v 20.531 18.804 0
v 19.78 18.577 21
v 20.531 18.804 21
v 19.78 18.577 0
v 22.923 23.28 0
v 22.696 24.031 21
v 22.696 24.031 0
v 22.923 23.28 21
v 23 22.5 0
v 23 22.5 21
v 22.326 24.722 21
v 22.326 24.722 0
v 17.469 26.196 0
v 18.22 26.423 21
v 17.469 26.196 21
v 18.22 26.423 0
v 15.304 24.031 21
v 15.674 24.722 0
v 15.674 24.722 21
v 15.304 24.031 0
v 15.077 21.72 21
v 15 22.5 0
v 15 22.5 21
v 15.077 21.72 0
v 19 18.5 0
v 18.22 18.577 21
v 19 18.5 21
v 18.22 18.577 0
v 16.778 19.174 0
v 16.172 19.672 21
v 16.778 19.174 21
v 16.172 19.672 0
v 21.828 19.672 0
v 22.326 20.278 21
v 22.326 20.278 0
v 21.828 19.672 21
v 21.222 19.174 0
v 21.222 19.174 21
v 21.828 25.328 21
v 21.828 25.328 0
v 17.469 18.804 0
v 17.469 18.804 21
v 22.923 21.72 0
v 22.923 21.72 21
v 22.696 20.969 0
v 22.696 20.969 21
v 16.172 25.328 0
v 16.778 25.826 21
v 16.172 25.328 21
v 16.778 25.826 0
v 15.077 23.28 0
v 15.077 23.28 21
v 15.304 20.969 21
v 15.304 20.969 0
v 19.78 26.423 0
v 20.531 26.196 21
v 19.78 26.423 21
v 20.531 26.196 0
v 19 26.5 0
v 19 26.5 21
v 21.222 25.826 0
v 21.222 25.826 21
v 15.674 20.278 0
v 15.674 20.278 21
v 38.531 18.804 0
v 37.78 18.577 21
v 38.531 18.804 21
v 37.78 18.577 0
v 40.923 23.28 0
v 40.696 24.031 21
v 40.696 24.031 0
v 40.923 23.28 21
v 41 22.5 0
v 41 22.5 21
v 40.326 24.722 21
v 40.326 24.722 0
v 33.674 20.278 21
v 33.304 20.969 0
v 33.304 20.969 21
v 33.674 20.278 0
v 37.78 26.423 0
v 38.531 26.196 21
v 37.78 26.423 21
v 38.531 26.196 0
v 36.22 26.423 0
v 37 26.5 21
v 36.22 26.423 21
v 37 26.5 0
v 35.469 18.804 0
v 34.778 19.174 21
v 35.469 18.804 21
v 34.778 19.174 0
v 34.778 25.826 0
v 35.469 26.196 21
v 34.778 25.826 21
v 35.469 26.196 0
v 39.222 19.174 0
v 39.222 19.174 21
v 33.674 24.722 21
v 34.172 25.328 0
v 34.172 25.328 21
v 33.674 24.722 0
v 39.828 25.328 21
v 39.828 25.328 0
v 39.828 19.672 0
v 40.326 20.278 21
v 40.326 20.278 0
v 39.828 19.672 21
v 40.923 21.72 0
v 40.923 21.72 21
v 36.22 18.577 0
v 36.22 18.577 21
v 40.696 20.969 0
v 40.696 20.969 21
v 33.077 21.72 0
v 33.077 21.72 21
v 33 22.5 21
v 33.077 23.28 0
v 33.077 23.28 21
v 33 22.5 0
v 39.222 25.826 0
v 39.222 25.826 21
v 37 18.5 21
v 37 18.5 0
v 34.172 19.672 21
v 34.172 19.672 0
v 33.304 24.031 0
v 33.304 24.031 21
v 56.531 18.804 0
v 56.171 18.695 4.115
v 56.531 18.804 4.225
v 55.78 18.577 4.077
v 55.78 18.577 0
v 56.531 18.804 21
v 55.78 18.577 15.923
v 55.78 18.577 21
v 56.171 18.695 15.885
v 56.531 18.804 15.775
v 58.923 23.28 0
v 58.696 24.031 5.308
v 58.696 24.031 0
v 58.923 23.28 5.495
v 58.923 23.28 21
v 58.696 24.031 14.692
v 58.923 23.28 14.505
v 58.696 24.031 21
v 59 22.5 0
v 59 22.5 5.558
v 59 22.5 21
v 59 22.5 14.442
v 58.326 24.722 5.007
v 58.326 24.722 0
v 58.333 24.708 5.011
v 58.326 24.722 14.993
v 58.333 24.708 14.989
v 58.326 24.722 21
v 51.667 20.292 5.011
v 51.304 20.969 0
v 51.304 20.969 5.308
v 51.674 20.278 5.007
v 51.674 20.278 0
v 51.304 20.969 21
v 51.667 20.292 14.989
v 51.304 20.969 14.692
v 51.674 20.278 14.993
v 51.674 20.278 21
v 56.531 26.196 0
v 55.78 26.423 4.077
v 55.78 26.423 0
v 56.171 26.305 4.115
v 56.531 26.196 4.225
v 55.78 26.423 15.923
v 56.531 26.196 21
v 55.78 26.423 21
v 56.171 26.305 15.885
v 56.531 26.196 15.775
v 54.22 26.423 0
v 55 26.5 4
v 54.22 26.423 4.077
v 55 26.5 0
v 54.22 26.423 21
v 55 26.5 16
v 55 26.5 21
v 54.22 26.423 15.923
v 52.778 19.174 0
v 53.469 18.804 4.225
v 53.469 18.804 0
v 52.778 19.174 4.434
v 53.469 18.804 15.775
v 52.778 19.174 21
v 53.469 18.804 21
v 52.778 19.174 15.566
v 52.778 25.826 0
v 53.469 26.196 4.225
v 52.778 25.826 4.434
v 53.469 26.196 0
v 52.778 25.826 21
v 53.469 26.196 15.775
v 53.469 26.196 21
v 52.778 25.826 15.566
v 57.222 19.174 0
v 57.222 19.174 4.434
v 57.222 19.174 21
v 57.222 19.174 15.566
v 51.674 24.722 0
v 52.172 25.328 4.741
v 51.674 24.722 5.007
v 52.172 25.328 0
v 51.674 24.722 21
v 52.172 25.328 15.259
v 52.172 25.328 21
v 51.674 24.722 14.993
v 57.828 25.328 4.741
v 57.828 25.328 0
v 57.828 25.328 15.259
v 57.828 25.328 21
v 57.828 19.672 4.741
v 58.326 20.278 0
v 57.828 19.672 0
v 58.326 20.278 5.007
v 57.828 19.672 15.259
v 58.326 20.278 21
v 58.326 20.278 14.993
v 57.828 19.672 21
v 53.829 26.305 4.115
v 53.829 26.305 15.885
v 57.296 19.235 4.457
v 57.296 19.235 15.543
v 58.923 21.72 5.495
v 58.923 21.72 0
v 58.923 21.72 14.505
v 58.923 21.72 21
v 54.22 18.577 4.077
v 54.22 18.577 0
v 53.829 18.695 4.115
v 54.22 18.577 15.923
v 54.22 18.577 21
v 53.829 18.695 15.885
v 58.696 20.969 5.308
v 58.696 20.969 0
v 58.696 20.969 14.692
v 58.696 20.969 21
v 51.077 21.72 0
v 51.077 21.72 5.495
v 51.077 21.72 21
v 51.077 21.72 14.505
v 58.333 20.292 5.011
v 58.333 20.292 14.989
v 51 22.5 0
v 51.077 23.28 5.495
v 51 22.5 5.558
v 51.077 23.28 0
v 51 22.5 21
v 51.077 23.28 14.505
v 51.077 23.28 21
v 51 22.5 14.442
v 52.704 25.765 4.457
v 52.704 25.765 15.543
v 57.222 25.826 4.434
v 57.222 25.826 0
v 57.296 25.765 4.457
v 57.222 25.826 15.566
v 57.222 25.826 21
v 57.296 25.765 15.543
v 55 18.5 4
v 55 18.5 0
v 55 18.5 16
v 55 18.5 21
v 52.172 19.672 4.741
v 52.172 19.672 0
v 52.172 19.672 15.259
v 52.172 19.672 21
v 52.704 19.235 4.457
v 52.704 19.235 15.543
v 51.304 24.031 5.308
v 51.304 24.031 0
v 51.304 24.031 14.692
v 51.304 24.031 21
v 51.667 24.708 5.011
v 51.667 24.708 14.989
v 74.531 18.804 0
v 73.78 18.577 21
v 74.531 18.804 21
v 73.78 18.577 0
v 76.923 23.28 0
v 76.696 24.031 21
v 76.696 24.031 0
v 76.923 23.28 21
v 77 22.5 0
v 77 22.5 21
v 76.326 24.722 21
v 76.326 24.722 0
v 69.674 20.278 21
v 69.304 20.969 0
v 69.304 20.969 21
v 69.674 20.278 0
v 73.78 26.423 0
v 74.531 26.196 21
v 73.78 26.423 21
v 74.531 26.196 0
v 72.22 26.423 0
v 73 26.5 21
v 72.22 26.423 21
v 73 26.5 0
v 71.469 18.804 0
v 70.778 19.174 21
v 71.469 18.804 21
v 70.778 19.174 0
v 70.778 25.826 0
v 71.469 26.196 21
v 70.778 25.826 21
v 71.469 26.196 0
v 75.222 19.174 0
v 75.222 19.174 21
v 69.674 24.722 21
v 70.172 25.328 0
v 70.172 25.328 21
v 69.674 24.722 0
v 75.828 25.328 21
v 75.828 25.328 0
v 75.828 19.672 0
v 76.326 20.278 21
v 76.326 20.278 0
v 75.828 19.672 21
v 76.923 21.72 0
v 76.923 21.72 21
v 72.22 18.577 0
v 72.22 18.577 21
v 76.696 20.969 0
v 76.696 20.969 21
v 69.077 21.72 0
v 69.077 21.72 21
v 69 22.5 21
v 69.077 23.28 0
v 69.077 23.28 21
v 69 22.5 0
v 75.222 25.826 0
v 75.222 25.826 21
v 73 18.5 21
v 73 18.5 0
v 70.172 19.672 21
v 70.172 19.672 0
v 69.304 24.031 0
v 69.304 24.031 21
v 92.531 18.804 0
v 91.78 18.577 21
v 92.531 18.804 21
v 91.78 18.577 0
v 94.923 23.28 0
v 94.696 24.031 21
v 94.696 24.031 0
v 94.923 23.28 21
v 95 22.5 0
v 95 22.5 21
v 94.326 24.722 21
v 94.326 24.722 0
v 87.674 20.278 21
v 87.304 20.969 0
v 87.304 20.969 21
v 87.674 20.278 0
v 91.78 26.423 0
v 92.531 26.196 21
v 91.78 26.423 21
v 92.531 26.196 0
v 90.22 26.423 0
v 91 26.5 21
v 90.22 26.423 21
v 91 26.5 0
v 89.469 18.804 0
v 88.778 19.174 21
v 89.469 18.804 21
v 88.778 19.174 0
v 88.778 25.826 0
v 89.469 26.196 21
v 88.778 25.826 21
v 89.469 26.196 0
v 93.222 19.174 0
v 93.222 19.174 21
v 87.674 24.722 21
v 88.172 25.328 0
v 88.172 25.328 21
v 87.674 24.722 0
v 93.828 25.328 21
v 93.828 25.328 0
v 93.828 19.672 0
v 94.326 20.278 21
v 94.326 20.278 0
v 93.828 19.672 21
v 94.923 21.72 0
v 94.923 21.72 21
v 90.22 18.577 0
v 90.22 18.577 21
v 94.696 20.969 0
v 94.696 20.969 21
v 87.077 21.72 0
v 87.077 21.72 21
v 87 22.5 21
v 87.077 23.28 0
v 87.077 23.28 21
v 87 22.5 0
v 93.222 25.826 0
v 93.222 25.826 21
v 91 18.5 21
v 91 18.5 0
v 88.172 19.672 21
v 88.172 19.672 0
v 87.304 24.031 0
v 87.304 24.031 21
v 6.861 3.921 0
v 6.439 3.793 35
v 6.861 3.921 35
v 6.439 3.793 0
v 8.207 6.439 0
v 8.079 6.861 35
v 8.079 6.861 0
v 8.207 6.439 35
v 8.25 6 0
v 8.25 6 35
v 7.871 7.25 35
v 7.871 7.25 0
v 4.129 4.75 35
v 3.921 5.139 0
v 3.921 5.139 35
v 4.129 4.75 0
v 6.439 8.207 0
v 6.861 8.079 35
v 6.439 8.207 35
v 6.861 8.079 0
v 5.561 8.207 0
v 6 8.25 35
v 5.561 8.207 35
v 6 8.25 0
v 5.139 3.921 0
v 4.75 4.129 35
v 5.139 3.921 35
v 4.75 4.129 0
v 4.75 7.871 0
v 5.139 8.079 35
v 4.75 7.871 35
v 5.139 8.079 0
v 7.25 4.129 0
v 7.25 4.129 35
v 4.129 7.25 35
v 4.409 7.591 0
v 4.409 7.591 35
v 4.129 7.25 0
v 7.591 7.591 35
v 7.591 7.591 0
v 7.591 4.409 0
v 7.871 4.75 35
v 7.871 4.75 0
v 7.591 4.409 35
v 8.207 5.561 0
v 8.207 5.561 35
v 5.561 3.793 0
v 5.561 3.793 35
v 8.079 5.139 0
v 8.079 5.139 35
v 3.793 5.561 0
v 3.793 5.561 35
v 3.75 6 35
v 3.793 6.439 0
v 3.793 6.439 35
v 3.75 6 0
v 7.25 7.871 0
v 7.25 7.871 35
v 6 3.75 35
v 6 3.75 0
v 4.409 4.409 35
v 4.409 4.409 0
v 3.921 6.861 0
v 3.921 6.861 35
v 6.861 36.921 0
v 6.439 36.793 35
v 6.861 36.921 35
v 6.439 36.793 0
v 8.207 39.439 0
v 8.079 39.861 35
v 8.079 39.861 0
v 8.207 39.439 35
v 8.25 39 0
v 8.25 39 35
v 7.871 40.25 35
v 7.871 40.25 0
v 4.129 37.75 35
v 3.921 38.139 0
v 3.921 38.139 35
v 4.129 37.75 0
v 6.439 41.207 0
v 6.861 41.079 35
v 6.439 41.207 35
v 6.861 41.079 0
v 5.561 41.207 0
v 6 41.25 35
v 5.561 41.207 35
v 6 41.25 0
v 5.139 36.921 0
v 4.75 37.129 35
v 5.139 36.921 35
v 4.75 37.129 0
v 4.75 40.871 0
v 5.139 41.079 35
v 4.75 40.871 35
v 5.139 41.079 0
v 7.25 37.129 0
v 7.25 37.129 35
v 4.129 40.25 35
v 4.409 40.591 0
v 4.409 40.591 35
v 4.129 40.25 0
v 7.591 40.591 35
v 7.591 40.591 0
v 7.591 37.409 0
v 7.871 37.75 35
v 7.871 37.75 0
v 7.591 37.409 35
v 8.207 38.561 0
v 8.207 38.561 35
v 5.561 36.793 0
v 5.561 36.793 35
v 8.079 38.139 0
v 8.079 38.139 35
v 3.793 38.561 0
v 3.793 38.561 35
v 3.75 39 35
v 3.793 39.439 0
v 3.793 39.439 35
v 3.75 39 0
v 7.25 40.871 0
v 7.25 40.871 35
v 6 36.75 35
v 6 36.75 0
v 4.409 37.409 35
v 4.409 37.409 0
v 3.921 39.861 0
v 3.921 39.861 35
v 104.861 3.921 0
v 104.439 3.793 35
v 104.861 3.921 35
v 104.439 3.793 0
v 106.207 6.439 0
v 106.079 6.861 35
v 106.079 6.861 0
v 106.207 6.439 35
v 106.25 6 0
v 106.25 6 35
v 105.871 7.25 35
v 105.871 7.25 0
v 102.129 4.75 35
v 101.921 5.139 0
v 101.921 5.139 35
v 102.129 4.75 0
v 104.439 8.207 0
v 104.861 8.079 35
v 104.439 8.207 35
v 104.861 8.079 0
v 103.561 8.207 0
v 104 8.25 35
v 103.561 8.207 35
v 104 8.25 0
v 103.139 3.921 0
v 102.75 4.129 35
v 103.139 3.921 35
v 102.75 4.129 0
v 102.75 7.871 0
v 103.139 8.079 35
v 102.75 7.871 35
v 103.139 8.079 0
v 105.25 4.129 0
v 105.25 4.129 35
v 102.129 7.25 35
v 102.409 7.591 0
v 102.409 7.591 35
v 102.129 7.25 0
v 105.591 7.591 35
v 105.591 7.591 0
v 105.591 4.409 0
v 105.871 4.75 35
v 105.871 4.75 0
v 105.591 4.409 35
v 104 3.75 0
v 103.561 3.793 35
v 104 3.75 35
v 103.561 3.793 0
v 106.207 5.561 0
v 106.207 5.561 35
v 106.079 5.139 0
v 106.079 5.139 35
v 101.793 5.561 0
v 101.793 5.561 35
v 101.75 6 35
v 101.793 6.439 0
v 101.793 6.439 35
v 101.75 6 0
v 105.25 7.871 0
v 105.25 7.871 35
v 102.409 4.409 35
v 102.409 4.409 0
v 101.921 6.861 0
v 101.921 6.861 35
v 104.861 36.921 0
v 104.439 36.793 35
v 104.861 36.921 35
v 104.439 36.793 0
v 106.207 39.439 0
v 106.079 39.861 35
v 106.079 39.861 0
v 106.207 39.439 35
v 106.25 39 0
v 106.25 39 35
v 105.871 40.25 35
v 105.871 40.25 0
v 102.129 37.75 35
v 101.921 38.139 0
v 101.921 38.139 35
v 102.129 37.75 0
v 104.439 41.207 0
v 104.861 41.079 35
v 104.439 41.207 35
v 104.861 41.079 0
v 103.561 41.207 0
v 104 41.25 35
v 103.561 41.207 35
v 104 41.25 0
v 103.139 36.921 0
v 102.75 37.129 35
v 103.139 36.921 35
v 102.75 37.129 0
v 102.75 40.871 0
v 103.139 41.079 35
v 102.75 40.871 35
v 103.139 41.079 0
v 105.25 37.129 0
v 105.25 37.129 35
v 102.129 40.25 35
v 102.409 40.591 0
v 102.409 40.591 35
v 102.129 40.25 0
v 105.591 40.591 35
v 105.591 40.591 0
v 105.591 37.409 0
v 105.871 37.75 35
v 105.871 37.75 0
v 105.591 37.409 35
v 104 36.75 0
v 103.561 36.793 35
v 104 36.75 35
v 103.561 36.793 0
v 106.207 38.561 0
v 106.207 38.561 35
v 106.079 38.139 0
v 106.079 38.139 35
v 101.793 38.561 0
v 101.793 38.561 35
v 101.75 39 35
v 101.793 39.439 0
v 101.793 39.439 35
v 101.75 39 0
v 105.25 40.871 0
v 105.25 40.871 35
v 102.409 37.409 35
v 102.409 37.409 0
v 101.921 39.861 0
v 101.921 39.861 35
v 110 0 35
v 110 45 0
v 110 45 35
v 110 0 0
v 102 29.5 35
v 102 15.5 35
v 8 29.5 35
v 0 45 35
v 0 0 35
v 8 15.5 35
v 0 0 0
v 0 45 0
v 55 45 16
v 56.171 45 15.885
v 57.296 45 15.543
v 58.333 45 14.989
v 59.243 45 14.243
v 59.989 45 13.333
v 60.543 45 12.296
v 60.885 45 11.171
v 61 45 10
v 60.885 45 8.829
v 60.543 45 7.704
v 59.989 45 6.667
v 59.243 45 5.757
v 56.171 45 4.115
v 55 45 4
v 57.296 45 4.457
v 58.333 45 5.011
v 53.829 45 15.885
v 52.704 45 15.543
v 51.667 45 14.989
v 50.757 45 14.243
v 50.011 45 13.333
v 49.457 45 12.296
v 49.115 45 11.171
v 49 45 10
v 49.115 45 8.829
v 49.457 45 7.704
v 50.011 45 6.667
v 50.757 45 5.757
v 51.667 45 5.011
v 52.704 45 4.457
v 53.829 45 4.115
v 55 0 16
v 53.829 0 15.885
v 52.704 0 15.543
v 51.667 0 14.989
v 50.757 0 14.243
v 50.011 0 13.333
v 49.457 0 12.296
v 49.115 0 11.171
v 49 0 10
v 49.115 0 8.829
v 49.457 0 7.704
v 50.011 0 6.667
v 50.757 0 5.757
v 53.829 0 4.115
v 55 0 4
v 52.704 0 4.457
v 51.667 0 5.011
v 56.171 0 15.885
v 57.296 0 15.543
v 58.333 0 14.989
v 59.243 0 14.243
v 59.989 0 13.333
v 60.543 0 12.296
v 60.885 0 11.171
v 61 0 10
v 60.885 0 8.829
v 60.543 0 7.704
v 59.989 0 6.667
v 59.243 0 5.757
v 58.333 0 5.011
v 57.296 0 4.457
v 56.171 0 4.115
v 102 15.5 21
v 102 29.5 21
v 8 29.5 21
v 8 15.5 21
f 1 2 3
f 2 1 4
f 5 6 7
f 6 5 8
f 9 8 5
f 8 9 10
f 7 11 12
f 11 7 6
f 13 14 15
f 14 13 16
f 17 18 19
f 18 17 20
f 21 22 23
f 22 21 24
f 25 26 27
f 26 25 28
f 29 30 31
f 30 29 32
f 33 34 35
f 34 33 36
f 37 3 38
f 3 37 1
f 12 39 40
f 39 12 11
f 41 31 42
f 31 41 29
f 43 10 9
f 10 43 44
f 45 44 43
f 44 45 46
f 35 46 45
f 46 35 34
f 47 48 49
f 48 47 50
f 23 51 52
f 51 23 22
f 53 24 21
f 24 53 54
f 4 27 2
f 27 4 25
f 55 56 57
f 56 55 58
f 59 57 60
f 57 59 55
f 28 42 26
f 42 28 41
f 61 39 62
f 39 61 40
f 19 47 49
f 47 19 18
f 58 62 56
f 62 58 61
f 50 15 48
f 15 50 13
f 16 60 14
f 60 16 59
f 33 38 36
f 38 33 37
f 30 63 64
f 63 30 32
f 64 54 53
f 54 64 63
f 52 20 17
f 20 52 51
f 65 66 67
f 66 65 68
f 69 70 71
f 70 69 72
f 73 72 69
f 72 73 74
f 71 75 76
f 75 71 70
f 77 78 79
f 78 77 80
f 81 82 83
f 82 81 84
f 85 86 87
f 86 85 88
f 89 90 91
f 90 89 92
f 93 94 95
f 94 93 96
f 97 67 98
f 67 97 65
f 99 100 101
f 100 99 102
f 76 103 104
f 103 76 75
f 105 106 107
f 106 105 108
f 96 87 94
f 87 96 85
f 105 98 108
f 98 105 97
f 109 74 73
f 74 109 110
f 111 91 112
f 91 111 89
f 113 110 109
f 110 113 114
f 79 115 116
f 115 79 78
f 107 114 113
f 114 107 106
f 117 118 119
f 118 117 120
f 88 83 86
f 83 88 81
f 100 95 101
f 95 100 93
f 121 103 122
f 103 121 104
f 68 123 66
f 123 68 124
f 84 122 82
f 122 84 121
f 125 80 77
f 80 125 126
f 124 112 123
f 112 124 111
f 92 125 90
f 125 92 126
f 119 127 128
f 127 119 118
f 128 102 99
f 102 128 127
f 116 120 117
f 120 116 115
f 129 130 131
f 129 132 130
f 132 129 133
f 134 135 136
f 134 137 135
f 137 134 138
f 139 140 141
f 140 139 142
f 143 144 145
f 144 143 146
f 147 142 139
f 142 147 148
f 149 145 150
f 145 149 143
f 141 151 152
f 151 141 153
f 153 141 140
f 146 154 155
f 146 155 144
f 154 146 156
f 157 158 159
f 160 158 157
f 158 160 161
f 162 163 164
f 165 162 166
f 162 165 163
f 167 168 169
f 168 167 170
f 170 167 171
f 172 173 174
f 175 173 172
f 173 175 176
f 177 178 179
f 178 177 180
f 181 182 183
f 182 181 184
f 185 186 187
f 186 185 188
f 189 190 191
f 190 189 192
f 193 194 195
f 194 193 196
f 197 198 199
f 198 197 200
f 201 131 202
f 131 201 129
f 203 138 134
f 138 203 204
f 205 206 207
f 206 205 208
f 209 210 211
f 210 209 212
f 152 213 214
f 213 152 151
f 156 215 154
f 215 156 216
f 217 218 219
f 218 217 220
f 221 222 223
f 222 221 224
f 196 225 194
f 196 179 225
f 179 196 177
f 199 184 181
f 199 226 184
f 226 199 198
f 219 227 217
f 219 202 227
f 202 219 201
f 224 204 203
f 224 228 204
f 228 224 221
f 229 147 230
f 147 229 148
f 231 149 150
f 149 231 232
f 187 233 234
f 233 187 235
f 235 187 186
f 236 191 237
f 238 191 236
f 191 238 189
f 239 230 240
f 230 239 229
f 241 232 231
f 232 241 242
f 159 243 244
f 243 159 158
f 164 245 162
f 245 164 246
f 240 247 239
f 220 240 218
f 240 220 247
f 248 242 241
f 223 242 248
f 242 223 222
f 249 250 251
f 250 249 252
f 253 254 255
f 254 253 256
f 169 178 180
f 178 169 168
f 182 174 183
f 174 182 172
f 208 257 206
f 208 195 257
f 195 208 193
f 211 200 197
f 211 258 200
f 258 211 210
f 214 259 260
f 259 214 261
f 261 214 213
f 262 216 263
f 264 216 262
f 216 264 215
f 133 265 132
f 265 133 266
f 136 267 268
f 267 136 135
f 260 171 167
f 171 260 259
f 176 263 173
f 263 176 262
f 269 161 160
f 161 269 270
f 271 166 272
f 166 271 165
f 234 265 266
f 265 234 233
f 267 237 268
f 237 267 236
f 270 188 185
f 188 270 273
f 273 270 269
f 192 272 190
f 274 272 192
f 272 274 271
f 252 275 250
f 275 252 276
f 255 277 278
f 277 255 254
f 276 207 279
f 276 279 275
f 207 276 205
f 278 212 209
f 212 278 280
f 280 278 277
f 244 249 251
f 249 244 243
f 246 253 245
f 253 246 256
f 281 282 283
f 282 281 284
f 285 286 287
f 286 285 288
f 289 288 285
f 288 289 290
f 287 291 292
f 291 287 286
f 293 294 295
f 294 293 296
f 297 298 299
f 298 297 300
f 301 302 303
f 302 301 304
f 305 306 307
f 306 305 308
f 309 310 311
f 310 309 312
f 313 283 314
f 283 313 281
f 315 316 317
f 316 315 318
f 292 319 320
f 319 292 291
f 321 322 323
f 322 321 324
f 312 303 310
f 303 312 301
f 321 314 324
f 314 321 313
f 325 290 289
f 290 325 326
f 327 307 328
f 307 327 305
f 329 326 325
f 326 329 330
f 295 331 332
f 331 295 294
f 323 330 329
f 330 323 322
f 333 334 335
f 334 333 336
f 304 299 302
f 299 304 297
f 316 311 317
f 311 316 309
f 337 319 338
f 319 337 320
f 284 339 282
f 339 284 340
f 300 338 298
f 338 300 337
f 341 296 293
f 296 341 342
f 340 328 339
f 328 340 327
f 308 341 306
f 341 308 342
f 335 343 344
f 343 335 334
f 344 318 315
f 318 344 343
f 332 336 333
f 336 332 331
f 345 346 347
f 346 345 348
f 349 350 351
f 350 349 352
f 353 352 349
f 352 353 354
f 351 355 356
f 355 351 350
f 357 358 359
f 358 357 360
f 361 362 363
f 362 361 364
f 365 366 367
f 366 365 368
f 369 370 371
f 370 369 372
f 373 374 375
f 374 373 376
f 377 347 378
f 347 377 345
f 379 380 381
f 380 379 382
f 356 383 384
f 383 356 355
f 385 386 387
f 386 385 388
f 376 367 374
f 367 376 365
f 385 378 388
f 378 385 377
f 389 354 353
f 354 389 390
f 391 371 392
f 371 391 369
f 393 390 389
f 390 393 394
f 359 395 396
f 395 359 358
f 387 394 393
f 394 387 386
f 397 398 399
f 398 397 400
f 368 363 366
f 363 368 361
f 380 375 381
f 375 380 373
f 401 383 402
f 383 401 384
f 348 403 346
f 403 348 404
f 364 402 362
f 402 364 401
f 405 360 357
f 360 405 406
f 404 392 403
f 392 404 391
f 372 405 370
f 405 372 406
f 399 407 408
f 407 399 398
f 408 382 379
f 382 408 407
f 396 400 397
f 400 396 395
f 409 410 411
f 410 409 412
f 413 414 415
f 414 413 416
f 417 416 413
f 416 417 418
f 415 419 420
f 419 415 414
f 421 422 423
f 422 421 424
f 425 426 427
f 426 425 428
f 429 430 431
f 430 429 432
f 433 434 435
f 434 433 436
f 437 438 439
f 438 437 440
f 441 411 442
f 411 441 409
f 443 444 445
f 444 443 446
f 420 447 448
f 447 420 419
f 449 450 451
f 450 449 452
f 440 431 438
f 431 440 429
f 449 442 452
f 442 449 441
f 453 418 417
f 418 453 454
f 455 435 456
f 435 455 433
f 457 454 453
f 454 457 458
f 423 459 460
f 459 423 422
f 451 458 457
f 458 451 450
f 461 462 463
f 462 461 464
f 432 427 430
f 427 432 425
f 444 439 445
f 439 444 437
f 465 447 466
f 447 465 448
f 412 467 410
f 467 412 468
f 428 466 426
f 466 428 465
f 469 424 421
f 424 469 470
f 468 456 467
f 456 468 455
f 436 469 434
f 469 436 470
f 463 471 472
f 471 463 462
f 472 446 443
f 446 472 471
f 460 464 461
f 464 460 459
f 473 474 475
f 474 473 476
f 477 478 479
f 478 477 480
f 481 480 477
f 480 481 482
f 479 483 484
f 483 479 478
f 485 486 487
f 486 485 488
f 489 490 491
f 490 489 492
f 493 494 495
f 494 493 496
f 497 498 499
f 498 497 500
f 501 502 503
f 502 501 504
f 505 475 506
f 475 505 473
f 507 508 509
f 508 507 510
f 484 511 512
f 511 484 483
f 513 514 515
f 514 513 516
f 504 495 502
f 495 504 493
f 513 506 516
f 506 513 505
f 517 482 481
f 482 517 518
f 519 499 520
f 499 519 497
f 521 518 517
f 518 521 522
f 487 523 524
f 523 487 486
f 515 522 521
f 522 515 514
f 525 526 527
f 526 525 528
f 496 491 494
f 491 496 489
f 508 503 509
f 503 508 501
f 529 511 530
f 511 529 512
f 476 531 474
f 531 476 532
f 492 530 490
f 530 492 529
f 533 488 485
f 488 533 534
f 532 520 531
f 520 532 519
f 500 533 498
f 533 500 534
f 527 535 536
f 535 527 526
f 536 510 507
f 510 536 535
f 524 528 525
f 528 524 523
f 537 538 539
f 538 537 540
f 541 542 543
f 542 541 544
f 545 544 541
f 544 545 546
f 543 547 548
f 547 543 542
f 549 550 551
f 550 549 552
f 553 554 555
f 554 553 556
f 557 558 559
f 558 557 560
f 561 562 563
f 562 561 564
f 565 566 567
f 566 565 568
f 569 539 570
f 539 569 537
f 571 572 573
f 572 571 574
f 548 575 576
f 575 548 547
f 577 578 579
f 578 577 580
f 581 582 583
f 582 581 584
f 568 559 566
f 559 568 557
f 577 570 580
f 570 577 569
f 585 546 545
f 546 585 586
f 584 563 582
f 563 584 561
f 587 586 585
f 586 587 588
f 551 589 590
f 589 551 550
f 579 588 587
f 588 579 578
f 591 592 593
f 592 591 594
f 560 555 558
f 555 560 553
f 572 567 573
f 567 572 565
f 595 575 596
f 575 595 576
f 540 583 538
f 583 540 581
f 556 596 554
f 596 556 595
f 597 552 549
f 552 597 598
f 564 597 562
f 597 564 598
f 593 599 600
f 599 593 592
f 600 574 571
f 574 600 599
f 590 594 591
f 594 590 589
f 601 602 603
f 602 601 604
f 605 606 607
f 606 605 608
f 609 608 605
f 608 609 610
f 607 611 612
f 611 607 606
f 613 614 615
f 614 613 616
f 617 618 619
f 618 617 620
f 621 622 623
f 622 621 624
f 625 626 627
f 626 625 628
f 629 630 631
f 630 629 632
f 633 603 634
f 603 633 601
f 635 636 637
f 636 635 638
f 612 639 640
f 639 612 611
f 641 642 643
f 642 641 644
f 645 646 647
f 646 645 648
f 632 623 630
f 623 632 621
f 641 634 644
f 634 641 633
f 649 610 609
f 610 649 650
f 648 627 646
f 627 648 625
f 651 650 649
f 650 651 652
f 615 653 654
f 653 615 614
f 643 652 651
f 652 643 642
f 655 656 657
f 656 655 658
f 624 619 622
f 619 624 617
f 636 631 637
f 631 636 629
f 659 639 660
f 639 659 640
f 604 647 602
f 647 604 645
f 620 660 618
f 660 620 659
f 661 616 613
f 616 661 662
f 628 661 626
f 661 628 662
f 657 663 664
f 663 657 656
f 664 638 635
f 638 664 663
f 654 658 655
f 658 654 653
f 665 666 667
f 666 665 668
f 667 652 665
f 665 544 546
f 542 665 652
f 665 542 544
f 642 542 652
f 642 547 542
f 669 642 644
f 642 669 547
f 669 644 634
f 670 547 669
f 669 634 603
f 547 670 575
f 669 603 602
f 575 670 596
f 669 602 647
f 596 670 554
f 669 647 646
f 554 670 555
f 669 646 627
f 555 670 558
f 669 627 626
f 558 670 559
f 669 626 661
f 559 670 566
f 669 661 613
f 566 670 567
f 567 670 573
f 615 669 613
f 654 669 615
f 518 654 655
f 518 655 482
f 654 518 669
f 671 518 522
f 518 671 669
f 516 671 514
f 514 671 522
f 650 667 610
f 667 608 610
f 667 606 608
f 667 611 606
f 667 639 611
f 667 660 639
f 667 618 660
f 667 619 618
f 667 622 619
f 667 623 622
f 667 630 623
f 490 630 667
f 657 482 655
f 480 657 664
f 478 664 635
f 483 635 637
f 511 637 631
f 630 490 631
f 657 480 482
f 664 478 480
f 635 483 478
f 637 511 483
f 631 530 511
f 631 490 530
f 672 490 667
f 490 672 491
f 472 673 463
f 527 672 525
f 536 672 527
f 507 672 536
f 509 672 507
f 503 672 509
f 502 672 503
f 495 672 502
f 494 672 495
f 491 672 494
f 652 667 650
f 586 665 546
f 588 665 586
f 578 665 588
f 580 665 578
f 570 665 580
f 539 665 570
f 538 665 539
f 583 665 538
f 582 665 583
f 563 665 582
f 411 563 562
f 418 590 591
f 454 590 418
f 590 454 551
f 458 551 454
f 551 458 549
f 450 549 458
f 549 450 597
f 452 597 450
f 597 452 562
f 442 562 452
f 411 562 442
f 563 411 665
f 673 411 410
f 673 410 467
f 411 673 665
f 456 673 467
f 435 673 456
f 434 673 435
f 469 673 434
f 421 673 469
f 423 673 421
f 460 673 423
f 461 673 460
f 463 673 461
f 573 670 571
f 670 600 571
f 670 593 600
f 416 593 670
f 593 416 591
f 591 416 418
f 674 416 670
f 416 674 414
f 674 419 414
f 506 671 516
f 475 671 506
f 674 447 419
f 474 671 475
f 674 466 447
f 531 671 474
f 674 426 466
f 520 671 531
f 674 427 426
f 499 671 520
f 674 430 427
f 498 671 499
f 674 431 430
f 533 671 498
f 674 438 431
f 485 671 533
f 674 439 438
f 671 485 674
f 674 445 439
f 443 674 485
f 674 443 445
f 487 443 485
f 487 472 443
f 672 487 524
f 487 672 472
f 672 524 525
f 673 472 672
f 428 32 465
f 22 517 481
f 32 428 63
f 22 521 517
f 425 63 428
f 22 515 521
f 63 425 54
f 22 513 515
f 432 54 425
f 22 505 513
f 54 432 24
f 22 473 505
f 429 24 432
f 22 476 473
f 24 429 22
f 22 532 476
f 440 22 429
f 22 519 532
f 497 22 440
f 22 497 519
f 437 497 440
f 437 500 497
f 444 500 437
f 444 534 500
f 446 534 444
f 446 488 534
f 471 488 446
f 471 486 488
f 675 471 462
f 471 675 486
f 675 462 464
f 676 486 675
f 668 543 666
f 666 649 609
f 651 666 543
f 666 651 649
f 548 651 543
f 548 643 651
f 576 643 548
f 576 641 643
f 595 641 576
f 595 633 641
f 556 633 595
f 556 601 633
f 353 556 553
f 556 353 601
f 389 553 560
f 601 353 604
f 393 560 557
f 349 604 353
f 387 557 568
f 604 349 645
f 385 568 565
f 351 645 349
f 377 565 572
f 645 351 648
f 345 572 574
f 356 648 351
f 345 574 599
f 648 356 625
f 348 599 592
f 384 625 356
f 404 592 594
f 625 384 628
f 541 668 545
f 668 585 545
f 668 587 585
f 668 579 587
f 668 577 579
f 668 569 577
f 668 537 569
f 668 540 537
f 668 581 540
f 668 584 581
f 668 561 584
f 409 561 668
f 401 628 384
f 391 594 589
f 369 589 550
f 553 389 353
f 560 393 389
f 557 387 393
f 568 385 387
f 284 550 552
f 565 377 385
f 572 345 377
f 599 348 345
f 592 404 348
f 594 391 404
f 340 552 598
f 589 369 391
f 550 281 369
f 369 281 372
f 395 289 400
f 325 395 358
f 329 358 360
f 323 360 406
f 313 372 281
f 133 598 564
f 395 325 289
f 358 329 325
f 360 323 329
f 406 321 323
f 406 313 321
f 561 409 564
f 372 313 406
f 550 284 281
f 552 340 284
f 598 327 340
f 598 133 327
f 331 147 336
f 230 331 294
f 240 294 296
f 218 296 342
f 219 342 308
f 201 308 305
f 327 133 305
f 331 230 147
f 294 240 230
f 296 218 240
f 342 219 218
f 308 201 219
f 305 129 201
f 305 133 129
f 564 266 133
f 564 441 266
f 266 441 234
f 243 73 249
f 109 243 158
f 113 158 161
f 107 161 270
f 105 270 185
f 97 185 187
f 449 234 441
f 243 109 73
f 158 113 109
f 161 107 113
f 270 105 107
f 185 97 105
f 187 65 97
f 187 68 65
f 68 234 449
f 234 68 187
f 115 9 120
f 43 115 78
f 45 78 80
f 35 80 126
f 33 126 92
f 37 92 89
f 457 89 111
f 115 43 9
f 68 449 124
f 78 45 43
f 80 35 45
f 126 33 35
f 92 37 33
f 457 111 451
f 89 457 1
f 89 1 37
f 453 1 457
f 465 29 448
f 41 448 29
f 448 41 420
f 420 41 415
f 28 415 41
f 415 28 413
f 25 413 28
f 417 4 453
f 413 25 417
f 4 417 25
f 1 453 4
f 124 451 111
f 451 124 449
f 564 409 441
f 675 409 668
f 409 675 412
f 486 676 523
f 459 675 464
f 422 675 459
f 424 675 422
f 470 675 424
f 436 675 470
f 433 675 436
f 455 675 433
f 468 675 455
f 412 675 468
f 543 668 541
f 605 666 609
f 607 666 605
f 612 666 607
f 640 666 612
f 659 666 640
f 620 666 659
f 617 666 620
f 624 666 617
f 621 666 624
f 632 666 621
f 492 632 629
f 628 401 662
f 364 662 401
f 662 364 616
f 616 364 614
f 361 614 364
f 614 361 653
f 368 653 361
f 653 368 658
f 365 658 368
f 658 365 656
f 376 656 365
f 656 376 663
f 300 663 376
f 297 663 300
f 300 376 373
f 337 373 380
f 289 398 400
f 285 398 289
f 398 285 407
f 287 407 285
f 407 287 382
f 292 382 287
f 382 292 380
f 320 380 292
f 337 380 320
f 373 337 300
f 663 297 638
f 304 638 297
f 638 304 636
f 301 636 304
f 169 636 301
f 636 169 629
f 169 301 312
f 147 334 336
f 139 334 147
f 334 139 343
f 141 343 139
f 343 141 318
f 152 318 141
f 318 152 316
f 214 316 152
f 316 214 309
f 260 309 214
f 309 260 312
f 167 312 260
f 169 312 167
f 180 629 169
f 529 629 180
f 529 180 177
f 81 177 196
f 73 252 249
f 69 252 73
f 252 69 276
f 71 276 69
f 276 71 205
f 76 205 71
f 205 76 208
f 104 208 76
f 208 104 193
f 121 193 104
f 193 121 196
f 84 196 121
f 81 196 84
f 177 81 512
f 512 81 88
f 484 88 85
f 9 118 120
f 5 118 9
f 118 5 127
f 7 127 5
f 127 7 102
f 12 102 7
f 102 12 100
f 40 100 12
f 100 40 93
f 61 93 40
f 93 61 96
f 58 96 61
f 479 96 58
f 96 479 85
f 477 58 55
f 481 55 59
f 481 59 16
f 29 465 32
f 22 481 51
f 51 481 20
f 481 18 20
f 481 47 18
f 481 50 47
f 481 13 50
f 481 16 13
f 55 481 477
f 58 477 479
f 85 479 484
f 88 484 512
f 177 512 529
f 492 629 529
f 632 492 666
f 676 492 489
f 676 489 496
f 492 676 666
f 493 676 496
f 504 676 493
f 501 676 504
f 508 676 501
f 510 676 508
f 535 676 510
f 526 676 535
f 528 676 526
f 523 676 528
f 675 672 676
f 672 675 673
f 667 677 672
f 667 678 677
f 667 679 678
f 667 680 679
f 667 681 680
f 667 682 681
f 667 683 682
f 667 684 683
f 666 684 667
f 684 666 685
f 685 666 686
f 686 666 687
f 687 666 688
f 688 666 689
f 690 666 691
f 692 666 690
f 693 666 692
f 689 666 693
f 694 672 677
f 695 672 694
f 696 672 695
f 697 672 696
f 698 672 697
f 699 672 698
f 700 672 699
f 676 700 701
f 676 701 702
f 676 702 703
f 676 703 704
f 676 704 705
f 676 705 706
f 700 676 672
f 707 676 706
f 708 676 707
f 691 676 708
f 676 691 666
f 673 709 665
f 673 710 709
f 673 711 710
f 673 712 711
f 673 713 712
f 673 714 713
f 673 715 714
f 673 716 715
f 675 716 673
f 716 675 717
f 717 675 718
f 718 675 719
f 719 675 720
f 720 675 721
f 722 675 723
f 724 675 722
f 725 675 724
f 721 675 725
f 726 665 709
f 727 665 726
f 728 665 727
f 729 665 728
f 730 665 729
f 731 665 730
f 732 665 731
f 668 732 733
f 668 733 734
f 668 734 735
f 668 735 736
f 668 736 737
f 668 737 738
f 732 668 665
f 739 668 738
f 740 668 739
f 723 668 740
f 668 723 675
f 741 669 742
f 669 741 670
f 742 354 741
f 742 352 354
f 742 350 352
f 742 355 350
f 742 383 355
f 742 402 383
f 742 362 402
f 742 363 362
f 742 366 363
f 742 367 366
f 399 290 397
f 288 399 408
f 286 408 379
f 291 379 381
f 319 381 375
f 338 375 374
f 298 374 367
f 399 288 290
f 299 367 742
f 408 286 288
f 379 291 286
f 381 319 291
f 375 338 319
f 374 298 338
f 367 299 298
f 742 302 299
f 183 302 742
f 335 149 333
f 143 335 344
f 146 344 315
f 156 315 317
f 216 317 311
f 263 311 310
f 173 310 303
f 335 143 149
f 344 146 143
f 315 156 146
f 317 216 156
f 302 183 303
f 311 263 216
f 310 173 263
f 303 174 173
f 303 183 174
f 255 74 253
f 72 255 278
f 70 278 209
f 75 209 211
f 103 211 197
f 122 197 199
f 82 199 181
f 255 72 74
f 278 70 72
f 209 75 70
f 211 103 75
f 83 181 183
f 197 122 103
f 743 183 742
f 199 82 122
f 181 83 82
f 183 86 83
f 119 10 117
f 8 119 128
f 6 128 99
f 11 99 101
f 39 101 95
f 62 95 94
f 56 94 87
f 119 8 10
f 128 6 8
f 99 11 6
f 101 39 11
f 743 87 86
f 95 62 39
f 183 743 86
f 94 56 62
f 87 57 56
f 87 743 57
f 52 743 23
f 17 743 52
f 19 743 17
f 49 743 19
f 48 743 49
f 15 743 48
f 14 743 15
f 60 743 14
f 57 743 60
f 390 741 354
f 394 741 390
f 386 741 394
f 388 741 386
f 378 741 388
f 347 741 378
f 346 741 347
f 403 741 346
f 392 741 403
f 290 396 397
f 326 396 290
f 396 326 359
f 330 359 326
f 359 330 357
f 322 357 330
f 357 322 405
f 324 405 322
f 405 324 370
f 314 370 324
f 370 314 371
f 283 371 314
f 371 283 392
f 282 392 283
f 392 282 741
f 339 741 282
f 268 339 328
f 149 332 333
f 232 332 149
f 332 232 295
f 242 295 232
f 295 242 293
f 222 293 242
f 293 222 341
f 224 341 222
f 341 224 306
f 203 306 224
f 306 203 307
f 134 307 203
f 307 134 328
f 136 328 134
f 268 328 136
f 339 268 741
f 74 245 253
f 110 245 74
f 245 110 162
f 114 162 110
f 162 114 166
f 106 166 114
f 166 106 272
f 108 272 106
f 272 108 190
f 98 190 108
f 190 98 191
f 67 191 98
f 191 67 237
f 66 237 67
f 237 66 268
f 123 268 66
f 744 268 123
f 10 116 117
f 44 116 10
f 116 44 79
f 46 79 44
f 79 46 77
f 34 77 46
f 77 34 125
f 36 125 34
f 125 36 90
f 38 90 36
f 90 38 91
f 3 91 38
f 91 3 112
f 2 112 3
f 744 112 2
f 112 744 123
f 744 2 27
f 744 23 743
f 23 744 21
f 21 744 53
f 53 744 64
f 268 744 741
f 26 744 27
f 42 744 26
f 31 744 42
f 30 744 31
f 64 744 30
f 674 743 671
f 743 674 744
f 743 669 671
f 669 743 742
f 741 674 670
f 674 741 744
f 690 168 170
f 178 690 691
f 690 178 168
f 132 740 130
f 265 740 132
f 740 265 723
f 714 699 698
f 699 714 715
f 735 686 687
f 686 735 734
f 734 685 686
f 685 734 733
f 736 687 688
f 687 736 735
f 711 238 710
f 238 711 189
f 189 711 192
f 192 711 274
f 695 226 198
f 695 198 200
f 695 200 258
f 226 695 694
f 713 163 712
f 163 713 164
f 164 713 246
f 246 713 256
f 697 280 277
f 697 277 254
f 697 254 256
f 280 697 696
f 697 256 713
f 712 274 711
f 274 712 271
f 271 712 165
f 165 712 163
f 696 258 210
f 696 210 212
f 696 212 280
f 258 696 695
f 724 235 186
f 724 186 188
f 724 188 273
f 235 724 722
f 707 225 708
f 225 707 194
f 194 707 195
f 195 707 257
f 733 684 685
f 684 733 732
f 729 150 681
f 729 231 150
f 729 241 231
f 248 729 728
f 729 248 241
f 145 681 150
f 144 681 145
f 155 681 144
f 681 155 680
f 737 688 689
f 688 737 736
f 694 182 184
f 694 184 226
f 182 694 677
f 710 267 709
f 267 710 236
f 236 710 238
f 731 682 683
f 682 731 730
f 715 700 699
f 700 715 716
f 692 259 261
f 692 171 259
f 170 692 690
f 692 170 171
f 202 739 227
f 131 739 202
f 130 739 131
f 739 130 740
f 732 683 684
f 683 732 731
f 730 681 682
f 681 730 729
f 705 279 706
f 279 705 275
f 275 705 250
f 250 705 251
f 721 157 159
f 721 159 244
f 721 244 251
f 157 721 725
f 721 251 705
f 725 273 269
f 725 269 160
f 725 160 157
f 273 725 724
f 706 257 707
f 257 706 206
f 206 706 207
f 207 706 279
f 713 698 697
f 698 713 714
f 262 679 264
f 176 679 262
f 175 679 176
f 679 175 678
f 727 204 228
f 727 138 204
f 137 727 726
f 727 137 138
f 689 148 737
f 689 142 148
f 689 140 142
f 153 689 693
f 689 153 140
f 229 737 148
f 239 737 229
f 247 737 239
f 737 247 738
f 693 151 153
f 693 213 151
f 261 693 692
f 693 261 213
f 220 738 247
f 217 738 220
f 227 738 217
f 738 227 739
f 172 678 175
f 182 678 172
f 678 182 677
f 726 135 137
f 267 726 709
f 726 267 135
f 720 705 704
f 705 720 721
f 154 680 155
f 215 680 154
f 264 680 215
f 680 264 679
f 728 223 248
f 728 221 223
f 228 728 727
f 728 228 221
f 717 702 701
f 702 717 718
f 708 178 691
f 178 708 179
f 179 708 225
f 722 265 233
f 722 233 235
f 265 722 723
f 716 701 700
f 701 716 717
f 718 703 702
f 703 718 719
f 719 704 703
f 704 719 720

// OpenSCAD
$fn = 32;

// ----------------------------------------------------------------------
// Manifold block: side_outlet manifold
// ----------------------------------------------------------------------

// --- parameters (mm) ---
block_l = 110;            // block length, X
block_w = 45;             // block width, Y
block_h = 35;             // block height, Z
port_d = 8;               // port bore diameter
port_pitch = 18;          // port pitch along X
gallery_d = 14;           // top gallery width, Y
gallery_depth = 14;       // gallery pocket depth
wall_p = 8;               // gallery end wall thickness, X
mnt_d = 4.5;              // mounting hole diameter
mnt_in = 6;               // mounting hole inset from the edges
out_d = 12;               // outlet bore diameter
out_z = 10;               // outlet axis height
fit_tol = 0.1;            // tolerance for press fits, mm
free_tol = 0.3;           // tolerance for clearance fits, mm

n_ports = 5;  // ports in the row
port_x0 = (block_l - (n_ports - 1) * port_pitch) / 2;  // first port X

difference() {
  cube([block_l, block_w, block_h]);
  for (i = [0 : n_ports - 1])
    translate([port_x0 + i * port_pitch, block_w / 2, -1])
      cylinder(h = block_h + 2, d = port_d);
  translate([wall_p, block_w / 2 - gallery_d / 2, block_h - gallery_depth])
    cube([block_l - 2 * wall_p, gallery_d, gallery_depth + 1]);
  for (cx = [mnt_in, block_l - mnt_in])
    for (cy = [mnt_in, block_w - mnt_in])
      translate([cx, cy, -1]) cylinder(h = block_h + 2, d = mnt_d);
  translate([block_l / 2, -1, out_z]) rotate([-90, 0, 0])
    cylinder(h = block_w + 2, d = out_d);
}
